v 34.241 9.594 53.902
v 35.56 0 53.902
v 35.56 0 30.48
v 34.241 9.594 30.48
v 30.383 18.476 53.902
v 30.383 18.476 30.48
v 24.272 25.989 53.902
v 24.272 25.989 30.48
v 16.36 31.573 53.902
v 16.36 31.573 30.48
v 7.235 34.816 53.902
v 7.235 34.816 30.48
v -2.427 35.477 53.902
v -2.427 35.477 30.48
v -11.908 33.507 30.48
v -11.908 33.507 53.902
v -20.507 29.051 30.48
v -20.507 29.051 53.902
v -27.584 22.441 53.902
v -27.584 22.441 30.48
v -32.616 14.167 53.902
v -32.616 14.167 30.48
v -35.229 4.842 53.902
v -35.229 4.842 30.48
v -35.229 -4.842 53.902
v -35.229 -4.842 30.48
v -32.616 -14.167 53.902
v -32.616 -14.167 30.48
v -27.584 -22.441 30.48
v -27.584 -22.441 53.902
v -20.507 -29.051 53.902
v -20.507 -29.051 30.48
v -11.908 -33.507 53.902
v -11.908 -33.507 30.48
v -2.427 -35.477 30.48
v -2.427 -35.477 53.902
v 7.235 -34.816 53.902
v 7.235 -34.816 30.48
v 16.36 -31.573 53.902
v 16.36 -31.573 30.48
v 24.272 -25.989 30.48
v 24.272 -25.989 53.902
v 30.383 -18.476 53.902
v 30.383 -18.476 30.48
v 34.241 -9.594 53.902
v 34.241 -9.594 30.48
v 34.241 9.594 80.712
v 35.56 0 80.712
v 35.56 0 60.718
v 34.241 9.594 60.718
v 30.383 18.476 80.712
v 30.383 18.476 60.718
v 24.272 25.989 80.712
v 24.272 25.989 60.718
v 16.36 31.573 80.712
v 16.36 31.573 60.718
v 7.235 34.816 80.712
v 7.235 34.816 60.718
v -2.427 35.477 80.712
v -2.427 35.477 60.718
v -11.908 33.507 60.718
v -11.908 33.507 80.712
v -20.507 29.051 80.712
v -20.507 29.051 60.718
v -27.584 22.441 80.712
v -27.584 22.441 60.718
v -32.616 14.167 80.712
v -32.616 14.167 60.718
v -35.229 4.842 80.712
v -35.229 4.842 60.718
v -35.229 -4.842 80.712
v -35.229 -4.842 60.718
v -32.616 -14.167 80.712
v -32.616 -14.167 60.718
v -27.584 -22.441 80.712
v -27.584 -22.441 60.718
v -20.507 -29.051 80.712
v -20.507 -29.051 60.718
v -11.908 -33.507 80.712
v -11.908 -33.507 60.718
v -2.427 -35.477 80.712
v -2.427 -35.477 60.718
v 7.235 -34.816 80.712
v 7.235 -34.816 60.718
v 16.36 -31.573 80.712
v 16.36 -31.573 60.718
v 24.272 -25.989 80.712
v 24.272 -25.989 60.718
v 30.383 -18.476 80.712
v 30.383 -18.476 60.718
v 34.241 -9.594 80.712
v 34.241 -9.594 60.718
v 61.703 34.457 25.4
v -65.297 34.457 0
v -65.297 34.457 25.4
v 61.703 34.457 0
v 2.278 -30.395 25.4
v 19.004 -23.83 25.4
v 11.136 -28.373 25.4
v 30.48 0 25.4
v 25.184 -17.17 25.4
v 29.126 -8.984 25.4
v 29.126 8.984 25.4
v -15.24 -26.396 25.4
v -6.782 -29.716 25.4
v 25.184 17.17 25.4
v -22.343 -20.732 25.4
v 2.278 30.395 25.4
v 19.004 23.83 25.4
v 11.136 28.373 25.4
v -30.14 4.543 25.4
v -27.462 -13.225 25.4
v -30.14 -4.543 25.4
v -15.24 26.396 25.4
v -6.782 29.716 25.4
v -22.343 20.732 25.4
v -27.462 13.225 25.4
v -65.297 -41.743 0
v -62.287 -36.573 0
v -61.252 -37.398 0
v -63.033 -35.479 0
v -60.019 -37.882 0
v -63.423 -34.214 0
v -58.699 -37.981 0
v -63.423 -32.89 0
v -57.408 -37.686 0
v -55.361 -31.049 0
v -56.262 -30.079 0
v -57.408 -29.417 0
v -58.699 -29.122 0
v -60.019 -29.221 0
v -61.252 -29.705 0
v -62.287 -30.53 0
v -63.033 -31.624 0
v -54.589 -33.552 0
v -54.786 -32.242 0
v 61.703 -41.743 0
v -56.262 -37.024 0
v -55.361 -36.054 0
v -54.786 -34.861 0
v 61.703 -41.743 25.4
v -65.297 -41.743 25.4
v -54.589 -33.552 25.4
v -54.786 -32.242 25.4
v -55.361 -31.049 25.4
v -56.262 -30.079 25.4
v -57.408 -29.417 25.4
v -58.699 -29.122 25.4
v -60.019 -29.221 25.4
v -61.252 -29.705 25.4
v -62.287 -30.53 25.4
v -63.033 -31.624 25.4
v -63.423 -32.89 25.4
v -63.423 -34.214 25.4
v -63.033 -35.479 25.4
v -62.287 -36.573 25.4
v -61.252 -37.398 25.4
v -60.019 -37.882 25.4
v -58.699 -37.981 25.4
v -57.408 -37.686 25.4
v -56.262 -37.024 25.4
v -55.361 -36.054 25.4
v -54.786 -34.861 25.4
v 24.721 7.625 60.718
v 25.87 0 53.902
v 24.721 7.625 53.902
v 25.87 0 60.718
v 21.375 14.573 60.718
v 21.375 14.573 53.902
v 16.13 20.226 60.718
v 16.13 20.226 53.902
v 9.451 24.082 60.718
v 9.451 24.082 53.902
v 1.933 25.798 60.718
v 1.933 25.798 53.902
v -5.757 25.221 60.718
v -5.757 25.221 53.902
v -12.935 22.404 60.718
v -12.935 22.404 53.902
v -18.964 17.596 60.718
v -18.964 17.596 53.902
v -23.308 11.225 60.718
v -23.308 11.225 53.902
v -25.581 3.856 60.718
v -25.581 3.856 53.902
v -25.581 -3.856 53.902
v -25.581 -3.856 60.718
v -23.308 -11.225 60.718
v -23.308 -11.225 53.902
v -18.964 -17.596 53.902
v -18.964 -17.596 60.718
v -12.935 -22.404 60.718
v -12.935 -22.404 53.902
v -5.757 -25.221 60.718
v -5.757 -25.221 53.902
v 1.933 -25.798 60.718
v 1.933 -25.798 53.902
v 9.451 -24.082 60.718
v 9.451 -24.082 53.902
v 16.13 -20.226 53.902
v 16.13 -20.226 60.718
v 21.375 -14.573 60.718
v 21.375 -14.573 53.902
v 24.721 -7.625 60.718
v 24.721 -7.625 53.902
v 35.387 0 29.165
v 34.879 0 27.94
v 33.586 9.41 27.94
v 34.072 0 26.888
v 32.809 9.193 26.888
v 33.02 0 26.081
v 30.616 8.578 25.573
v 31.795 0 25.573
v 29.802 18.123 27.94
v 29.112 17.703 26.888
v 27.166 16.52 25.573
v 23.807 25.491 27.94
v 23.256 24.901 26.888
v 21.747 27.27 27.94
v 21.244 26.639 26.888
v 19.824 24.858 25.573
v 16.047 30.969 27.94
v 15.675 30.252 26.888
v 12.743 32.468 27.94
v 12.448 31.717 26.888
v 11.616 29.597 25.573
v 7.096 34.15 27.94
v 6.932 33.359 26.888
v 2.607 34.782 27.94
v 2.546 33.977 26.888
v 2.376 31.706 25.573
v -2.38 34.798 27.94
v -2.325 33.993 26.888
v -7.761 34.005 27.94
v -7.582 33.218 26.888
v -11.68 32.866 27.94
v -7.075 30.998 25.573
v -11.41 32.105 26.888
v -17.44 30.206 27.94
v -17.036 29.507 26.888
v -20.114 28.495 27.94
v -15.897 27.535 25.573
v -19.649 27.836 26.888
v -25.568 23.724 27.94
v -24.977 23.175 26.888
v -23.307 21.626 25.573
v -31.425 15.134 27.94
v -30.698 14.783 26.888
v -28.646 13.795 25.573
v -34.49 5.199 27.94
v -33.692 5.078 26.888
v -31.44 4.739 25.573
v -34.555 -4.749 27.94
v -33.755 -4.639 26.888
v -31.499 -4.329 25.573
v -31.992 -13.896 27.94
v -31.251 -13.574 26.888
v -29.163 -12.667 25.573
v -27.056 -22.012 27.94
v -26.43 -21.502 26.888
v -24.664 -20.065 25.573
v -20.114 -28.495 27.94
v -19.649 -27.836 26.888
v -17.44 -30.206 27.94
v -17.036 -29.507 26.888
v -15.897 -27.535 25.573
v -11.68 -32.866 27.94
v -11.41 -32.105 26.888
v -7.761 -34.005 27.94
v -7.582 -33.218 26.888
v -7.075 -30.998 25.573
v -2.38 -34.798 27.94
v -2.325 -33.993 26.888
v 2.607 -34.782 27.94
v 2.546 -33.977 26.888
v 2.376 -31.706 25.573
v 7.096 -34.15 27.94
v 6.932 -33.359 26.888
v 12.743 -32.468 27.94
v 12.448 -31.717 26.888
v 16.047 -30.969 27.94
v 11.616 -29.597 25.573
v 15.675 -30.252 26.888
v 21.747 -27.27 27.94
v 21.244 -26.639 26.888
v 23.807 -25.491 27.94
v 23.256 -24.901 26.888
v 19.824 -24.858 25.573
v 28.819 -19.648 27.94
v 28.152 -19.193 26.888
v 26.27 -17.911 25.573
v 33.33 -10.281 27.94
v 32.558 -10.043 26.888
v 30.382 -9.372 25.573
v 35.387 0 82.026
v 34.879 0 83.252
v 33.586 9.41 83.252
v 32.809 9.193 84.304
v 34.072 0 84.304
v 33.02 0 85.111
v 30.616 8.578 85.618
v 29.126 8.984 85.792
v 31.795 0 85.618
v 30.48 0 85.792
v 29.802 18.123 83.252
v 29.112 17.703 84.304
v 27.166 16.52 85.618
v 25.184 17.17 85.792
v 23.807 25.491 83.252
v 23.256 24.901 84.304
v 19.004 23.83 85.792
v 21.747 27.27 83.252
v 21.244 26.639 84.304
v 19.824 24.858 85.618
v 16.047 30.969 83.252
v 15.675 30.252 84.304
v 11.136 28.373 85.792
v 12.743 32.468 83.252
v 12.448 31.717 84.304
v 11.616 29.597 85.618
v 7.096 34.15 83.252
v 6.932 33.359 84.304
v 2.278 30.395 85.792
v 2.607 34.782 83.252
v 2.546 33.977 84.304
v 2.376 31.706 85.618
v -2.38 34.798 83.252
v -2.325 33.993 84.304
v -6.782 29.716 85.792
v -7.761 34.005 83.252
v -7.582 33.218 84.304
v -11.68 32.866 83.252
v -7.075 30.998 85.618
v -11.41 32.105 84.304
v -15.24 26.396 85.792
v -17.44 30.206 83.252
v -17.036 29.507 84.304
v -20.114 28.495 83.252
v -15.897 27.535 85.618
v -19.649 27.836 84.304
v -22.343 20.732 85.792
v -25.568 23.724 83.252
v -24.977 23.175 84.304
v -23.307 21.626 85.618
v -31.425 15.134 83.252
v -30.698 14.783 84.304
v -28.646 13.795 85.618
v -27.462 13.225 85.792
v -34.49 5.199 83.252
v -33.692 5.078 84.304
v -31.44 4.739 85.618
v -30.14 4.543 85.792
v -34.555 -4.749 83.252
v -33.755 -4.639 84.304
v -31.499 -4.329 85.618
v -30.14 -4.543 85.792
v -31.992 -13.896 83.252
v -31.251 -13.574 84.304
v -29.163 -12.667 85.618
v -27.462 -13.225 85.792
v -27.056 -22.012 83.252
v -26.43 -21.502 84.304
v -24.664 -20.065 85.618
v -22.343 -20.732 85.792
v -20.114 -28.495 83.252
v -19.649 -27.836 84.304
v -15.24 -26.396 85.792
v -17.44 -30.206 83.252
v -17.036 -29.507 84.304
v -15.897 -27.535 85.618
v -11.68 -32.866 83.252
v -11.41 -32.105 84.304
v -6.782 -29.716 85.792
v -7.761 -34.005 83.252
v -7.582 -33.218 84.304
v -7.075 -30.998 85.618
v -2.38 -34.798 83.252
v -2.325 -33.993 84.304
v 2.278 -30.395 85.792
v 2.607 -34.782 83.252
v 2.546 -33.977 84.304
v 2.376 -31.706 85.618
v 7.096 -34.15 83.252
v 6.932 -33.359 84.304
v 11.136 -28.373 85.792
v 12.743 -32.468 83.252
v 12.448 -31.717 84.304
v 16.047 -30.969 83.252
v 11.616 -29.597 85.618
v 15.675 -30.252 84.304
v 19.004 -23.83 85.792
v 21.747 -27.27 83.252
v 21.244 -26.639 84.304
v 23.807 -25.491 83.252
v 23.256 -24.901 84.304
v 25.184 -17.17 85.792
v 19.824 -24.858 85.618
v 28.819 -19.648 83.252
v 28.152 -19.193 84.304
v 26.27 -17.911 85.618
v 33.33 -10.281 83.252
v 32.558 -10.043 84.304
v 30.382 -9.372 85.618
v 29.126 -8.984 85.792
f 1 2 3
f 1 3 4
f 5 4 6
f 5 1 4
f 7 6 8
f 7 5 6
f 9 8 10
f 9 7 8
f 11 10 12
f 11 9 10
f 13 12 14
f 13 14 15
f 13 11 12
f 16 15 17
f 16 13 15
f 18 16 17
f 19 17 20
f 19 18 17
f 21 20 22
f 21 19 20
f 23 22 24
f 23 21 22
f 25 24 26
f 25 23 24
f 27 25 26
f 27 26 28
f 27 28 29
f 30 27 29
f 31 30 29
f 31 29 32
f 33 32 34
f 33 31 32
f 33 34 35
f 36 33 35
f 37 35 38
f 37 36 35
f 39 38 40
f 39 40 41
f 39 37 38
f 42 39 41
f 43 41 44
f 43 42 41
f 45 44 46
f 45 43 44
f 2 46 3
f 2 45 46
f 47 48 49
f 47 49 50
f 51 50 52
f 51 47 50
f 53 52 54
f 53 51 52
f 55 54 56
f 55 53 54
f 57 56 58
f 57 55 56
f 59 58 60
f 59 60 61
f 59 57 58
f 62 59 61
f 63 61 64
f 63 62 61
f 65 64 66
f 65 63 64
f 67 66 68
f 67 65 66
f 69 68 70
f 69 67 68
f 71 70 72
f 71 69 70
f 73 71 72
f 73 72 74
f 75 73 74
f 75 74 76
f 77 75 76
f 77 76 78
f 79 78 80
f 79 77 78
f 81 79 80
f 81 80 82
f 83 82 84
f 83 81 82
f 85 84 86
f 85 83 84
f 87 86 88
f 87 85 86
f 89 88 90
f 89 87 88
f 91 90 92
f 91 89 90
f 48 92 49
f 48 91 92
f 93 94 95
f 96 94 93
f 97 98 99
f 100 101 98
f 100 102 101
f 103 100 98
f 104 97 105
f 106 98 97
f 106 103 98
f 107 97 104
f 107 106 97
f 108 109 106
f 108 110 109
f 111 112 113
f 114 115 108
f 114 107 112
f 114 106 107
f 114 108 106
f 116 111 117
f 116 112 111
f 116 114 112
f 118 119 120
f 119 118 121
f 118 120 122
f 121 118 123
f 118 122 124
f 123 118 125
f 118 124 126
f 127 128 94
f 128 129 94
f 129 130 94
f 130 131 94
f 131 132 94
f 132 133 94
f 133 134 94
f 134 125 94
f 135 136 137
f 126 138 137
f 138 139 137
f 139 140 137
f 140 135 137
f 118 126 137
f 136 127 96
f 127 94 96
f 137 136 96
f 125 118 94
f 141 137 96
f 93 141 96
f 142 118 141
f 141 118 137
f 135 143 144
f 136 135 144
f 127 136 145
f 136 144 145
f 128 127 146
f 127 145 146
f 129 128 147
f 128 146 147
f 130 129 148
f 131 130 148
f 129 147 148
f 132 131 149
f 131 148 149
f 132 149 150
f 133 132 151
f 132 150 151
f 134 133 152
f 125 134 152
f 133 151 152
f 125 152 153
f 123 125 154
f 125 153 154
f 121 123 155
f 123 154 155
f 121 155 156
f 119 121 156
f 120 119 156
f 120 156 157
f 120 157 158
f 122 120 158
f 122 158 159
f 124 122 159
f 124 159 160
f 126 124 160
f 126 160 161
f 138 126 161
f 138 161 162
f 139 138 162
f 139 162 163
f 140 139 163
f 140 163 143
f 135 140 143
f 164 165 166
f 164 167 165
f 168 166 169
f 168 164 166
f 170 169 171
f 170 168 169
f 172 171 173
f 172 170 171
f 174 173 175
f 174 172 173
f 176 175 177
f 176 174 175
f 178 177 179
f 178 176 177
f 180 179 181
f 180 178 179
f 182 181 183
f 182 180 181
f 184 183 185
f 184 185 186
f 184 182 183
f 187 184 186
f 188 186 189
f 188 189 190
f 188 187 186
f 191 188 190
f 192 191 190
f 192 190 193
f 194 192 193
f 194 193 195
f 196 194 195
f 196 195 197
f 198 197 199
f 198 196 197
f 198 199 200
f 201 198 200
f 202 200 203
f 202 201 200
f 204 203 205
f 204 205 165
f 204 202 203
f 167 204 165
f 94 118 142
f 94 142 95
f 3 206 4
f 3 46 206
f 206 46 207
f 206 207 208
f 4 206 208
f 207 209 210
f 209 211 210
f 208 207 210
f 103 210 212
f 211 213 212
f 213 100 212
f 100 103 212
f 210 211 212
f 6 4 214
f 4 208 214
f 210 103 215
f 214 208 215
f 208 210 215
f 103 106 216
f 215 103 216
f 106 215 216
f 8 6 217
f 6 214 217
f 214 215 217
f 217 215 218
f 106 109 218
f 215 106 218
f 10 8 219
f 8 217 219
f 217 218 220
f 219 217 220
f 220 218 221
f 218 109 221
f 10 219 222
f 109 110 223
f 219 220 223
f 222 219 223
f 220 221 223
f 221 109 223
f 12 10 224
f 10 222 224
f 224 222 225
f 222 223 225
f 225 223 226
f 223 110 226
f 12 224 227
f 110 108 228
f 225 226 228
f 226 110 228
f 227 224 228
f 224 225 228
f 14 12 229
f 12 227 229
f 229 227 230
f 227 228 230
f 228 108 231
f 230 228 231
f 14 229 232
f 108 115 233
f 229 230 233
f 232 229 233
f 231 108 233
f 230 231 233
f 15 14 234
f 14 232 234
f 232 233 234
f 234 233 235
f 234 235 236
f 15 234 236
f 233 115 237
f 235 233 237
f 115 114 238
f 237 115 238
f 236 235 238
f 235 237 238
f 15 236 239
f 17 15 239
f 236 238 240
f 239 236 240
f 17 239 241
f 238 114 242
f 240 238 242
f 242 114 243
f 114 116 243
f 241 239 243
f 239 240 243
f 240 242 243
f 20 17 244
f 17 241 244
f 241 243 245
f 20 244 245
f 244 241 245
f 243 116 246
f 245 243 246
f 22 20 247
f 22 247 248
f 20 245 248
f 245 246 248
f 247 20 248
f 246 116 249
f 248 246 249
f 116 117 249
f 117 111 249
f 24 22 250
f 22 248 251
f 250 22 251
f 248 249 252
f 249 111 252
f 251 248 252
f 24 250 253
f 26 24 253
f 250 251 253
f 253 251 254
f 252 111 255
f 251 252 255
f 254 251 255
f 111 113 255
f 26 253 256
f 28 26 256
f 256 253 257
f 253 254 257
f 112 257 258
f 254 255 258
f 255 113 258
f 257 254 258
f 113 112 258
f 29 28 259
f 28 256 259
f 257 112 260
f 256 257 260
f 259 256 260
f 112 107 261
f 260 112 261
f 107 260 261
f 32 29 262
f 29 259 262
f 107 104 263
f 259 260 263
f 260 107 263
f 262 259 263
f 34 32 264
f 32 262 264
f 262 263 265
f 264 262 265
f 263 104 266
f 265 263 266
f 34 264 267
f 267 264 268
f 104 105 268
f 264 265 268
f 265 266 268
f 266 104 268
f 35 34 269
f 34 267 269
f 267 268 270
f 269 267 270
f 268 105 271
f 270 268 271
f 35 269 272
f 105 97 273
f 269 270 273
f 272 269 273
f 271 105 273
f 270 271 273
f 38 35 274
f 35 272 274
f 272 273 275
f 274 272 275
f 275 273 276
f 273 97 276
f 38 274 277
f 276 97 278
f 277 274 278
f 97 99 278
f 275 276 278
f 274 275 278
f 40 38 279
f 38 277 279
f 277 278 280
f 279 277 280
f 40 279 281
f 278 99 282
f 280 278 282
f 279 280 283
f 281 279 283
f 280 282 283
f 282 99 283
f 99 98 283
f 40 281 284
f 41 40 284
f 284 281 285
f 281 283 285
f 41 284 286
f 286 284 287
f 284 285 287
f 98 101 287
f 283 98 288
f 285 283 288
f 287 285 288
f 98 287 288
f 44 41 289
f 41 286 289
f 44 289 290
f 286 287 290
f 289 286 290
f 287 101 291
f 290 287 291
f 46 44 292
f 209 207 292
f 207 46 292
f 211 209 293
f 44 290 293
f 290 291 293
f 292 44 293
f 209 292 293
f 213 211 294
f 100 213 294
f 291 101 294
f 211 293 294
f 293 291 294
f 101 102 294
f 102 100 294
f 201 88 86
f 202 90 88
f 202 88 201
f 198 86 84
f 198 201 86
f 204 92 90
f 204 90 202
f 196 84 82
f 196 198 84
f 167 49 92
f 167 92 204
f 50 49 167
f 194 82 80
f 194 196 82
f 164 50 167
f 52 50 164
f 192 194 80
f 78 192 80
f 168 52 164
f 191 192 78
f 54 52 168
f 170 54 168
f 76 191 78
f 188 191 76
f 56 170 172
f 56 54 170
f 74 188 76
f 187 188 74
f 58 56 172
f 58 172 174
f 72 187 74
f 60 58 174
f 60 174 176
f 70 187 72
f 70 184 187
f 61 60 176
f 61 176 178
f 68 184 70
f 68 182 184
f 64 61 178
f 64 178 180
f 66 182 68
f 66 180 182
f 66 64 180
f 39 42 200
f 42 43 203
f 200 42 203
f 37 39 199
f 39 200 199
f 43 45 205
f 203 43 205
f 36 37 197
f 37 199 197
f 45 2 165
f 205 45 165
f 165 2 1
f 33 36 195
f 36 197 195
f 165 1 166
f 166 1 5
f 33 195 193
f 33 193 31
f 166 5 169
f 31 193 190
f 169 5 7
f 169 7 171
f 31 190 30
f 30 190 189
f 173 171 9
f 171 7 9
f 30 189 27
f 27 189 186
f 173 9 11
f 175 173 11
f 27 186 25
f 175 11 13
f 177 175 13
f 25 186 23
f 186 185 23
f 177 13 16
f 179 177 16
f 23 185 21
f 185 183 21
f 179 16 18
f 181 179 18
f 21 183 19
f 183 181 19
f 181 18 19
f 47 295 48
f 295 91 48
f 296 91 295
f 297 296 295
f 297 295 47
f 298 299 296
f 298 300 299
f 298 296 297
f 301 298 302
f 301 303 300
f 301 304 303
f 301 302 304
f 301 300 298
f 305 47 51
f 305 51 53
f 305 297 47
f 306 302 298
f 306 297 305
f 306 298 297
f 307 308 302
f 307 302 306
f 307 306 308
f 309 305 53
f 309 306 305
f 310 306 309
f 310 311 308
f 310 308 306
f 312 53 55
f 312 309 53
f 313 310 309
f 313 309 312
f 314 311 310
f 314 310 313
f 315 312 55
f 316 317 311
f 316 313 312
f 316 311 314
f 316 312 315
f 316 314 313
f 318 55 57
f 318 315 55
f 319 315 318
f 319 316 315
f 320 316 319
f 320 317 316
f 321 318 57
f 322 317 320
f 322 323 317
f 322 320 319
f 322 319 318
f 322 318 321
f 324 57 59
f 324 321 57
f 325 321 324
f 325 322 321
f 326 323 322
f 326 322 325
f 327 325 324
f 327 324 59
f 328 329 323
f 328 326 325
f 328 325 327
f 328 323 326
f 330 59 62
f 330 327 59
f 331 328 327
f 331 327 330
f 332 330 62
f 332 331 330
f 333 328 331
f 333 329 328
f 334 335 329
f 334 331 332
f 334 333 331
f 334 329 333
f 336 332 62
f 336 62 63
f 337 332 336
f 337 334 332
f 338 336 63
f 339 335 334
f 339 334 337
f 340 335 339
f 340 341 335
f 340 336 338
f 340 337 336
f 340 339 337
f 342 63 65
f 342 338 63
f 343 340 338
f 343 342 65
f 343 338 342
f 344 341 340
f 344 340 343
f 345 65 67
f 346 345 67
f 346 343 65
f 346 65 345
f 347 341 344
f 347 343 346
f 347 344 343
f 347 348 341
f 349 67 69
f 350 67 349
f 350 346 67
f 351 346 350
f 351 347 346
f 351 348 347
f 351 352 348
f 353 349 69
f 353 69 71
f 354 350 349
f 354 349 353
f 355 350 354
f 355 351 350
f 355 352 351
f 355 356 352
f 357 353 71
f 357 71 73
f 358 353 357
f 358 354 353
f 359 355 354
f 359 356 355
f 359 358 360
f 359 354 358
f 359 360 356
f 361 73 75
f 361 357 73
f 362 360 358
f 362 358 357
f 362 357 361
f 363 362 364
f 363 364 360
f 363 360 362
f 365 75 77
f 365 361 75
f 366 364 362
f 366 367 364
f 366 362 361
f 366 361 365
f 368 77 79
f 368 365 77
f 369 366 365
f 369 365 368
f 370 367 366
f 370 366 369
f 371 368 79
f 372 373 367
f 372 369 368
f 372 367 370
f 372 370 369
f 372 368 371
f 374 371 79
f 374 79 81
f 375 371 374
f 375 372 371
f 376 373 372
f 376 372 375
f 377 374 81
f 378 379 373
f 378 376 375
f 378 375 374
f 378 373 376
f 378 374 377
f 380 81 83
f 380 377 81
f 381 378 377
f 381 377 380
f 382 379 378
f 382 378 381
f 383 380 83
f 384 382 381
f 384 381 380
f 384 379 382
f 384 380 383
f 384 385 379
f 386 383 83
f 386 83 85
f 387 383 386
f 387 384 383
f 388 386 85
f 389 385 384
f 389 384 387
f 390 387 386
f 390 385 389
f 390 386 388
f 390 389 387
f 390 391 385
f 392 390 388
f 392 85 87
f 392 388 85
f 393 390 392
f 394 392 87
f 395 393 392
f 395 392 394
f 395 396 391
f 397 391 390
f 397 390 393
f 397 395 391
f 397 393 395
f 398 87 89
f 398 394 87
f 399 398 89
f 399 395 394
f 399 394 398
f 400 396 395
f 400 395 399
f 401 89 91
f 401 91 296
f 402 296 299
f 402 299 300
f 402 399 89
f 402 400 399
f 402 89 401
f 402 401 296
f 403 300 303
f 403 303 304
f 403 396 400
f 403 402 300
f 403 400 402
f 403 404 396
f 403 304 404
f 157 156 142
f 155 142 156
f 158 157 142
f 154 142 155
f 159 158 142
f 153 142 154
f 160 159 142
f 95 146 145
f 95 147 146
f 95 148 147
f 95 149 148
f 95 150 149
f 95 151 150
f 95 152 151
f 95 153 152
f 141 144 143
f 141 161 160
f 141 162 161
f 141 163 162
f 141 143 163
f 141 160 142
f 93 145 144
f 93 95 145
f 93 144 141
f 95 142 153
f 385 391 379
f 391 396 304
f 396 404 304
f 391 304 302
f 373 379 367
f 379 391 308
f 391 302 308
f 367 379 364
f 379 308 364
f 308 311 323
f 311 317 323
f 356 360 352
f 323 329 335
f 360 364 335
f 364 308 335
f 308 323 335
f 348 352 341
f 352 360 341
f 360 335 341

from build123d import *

# Parameters (mm, degrees)
F0_W     = 127
F0_H     = 76.2
F1_DEPTH = 25.4
F2_R     = 4.441926
F3_DEPTH = 25.401
F4_W     = 35.56
F4_H     = 60.391565
F6_W     = 9.759322
F6_H     = 6.816041
F9_R     = 5.08
F10_R    = 5.08


with BuildPart() as f1:
    # F0 (on Top) → F1 (new body)
    with BuildSketch(Plane.XY):
        with Locations((-1.797293, -3.643412)):
            Rectangle(F0_W, F0_H)
    extrude(amount=F1_DEPTH)

    # F2 (on face) → F3 (cut, through all)
    with BuildSketch(Plane.XY.offset(25.4)):
        with Locations((-59.031062, -33.551604)):
            Circle(F2_R)
    extrude(amount=-F3_DEPTH, mode=Mode.SUBTRACT)


with BuildPart() as f5:
    # F4 (on Front) → F5 (revolve)
    with BuildSketch(Plane.XZ):
        with Locations((17.78, 55.595782)):
            Rectangle(F4_W, F4_H)
    revolve(axis=Axis((0, 0, 55.595783), (0, 0, 1)))

    # F6 (on Front) → F8 (revolve, cut)
    with BuildSketch(Plane.XZ):
        with Locations((30.74963, 57.310263)):
            Rectangle(F6_W, F6_H)
    revolve(axis=Axis((0, 0, 37.291419), (0, 0, 1)), mode=Mode.SUBTRACT)

    # F9
    f9_edges = [f5.edges().sort_by_distance(p)[0] for p in [
        (-35.56, 0, 85.791565),
    ]]
    fillet(f9_edges, radius=F9_R)

    # F10
    f10_edges = [f5.edges().sort_by_distance(p)[0] for p in [
        (-35.56, 0, 25.4),
    ]]
    fillet(f10_edges, radius=F10_R)


solid = Compound([f1.part, f5.part])
